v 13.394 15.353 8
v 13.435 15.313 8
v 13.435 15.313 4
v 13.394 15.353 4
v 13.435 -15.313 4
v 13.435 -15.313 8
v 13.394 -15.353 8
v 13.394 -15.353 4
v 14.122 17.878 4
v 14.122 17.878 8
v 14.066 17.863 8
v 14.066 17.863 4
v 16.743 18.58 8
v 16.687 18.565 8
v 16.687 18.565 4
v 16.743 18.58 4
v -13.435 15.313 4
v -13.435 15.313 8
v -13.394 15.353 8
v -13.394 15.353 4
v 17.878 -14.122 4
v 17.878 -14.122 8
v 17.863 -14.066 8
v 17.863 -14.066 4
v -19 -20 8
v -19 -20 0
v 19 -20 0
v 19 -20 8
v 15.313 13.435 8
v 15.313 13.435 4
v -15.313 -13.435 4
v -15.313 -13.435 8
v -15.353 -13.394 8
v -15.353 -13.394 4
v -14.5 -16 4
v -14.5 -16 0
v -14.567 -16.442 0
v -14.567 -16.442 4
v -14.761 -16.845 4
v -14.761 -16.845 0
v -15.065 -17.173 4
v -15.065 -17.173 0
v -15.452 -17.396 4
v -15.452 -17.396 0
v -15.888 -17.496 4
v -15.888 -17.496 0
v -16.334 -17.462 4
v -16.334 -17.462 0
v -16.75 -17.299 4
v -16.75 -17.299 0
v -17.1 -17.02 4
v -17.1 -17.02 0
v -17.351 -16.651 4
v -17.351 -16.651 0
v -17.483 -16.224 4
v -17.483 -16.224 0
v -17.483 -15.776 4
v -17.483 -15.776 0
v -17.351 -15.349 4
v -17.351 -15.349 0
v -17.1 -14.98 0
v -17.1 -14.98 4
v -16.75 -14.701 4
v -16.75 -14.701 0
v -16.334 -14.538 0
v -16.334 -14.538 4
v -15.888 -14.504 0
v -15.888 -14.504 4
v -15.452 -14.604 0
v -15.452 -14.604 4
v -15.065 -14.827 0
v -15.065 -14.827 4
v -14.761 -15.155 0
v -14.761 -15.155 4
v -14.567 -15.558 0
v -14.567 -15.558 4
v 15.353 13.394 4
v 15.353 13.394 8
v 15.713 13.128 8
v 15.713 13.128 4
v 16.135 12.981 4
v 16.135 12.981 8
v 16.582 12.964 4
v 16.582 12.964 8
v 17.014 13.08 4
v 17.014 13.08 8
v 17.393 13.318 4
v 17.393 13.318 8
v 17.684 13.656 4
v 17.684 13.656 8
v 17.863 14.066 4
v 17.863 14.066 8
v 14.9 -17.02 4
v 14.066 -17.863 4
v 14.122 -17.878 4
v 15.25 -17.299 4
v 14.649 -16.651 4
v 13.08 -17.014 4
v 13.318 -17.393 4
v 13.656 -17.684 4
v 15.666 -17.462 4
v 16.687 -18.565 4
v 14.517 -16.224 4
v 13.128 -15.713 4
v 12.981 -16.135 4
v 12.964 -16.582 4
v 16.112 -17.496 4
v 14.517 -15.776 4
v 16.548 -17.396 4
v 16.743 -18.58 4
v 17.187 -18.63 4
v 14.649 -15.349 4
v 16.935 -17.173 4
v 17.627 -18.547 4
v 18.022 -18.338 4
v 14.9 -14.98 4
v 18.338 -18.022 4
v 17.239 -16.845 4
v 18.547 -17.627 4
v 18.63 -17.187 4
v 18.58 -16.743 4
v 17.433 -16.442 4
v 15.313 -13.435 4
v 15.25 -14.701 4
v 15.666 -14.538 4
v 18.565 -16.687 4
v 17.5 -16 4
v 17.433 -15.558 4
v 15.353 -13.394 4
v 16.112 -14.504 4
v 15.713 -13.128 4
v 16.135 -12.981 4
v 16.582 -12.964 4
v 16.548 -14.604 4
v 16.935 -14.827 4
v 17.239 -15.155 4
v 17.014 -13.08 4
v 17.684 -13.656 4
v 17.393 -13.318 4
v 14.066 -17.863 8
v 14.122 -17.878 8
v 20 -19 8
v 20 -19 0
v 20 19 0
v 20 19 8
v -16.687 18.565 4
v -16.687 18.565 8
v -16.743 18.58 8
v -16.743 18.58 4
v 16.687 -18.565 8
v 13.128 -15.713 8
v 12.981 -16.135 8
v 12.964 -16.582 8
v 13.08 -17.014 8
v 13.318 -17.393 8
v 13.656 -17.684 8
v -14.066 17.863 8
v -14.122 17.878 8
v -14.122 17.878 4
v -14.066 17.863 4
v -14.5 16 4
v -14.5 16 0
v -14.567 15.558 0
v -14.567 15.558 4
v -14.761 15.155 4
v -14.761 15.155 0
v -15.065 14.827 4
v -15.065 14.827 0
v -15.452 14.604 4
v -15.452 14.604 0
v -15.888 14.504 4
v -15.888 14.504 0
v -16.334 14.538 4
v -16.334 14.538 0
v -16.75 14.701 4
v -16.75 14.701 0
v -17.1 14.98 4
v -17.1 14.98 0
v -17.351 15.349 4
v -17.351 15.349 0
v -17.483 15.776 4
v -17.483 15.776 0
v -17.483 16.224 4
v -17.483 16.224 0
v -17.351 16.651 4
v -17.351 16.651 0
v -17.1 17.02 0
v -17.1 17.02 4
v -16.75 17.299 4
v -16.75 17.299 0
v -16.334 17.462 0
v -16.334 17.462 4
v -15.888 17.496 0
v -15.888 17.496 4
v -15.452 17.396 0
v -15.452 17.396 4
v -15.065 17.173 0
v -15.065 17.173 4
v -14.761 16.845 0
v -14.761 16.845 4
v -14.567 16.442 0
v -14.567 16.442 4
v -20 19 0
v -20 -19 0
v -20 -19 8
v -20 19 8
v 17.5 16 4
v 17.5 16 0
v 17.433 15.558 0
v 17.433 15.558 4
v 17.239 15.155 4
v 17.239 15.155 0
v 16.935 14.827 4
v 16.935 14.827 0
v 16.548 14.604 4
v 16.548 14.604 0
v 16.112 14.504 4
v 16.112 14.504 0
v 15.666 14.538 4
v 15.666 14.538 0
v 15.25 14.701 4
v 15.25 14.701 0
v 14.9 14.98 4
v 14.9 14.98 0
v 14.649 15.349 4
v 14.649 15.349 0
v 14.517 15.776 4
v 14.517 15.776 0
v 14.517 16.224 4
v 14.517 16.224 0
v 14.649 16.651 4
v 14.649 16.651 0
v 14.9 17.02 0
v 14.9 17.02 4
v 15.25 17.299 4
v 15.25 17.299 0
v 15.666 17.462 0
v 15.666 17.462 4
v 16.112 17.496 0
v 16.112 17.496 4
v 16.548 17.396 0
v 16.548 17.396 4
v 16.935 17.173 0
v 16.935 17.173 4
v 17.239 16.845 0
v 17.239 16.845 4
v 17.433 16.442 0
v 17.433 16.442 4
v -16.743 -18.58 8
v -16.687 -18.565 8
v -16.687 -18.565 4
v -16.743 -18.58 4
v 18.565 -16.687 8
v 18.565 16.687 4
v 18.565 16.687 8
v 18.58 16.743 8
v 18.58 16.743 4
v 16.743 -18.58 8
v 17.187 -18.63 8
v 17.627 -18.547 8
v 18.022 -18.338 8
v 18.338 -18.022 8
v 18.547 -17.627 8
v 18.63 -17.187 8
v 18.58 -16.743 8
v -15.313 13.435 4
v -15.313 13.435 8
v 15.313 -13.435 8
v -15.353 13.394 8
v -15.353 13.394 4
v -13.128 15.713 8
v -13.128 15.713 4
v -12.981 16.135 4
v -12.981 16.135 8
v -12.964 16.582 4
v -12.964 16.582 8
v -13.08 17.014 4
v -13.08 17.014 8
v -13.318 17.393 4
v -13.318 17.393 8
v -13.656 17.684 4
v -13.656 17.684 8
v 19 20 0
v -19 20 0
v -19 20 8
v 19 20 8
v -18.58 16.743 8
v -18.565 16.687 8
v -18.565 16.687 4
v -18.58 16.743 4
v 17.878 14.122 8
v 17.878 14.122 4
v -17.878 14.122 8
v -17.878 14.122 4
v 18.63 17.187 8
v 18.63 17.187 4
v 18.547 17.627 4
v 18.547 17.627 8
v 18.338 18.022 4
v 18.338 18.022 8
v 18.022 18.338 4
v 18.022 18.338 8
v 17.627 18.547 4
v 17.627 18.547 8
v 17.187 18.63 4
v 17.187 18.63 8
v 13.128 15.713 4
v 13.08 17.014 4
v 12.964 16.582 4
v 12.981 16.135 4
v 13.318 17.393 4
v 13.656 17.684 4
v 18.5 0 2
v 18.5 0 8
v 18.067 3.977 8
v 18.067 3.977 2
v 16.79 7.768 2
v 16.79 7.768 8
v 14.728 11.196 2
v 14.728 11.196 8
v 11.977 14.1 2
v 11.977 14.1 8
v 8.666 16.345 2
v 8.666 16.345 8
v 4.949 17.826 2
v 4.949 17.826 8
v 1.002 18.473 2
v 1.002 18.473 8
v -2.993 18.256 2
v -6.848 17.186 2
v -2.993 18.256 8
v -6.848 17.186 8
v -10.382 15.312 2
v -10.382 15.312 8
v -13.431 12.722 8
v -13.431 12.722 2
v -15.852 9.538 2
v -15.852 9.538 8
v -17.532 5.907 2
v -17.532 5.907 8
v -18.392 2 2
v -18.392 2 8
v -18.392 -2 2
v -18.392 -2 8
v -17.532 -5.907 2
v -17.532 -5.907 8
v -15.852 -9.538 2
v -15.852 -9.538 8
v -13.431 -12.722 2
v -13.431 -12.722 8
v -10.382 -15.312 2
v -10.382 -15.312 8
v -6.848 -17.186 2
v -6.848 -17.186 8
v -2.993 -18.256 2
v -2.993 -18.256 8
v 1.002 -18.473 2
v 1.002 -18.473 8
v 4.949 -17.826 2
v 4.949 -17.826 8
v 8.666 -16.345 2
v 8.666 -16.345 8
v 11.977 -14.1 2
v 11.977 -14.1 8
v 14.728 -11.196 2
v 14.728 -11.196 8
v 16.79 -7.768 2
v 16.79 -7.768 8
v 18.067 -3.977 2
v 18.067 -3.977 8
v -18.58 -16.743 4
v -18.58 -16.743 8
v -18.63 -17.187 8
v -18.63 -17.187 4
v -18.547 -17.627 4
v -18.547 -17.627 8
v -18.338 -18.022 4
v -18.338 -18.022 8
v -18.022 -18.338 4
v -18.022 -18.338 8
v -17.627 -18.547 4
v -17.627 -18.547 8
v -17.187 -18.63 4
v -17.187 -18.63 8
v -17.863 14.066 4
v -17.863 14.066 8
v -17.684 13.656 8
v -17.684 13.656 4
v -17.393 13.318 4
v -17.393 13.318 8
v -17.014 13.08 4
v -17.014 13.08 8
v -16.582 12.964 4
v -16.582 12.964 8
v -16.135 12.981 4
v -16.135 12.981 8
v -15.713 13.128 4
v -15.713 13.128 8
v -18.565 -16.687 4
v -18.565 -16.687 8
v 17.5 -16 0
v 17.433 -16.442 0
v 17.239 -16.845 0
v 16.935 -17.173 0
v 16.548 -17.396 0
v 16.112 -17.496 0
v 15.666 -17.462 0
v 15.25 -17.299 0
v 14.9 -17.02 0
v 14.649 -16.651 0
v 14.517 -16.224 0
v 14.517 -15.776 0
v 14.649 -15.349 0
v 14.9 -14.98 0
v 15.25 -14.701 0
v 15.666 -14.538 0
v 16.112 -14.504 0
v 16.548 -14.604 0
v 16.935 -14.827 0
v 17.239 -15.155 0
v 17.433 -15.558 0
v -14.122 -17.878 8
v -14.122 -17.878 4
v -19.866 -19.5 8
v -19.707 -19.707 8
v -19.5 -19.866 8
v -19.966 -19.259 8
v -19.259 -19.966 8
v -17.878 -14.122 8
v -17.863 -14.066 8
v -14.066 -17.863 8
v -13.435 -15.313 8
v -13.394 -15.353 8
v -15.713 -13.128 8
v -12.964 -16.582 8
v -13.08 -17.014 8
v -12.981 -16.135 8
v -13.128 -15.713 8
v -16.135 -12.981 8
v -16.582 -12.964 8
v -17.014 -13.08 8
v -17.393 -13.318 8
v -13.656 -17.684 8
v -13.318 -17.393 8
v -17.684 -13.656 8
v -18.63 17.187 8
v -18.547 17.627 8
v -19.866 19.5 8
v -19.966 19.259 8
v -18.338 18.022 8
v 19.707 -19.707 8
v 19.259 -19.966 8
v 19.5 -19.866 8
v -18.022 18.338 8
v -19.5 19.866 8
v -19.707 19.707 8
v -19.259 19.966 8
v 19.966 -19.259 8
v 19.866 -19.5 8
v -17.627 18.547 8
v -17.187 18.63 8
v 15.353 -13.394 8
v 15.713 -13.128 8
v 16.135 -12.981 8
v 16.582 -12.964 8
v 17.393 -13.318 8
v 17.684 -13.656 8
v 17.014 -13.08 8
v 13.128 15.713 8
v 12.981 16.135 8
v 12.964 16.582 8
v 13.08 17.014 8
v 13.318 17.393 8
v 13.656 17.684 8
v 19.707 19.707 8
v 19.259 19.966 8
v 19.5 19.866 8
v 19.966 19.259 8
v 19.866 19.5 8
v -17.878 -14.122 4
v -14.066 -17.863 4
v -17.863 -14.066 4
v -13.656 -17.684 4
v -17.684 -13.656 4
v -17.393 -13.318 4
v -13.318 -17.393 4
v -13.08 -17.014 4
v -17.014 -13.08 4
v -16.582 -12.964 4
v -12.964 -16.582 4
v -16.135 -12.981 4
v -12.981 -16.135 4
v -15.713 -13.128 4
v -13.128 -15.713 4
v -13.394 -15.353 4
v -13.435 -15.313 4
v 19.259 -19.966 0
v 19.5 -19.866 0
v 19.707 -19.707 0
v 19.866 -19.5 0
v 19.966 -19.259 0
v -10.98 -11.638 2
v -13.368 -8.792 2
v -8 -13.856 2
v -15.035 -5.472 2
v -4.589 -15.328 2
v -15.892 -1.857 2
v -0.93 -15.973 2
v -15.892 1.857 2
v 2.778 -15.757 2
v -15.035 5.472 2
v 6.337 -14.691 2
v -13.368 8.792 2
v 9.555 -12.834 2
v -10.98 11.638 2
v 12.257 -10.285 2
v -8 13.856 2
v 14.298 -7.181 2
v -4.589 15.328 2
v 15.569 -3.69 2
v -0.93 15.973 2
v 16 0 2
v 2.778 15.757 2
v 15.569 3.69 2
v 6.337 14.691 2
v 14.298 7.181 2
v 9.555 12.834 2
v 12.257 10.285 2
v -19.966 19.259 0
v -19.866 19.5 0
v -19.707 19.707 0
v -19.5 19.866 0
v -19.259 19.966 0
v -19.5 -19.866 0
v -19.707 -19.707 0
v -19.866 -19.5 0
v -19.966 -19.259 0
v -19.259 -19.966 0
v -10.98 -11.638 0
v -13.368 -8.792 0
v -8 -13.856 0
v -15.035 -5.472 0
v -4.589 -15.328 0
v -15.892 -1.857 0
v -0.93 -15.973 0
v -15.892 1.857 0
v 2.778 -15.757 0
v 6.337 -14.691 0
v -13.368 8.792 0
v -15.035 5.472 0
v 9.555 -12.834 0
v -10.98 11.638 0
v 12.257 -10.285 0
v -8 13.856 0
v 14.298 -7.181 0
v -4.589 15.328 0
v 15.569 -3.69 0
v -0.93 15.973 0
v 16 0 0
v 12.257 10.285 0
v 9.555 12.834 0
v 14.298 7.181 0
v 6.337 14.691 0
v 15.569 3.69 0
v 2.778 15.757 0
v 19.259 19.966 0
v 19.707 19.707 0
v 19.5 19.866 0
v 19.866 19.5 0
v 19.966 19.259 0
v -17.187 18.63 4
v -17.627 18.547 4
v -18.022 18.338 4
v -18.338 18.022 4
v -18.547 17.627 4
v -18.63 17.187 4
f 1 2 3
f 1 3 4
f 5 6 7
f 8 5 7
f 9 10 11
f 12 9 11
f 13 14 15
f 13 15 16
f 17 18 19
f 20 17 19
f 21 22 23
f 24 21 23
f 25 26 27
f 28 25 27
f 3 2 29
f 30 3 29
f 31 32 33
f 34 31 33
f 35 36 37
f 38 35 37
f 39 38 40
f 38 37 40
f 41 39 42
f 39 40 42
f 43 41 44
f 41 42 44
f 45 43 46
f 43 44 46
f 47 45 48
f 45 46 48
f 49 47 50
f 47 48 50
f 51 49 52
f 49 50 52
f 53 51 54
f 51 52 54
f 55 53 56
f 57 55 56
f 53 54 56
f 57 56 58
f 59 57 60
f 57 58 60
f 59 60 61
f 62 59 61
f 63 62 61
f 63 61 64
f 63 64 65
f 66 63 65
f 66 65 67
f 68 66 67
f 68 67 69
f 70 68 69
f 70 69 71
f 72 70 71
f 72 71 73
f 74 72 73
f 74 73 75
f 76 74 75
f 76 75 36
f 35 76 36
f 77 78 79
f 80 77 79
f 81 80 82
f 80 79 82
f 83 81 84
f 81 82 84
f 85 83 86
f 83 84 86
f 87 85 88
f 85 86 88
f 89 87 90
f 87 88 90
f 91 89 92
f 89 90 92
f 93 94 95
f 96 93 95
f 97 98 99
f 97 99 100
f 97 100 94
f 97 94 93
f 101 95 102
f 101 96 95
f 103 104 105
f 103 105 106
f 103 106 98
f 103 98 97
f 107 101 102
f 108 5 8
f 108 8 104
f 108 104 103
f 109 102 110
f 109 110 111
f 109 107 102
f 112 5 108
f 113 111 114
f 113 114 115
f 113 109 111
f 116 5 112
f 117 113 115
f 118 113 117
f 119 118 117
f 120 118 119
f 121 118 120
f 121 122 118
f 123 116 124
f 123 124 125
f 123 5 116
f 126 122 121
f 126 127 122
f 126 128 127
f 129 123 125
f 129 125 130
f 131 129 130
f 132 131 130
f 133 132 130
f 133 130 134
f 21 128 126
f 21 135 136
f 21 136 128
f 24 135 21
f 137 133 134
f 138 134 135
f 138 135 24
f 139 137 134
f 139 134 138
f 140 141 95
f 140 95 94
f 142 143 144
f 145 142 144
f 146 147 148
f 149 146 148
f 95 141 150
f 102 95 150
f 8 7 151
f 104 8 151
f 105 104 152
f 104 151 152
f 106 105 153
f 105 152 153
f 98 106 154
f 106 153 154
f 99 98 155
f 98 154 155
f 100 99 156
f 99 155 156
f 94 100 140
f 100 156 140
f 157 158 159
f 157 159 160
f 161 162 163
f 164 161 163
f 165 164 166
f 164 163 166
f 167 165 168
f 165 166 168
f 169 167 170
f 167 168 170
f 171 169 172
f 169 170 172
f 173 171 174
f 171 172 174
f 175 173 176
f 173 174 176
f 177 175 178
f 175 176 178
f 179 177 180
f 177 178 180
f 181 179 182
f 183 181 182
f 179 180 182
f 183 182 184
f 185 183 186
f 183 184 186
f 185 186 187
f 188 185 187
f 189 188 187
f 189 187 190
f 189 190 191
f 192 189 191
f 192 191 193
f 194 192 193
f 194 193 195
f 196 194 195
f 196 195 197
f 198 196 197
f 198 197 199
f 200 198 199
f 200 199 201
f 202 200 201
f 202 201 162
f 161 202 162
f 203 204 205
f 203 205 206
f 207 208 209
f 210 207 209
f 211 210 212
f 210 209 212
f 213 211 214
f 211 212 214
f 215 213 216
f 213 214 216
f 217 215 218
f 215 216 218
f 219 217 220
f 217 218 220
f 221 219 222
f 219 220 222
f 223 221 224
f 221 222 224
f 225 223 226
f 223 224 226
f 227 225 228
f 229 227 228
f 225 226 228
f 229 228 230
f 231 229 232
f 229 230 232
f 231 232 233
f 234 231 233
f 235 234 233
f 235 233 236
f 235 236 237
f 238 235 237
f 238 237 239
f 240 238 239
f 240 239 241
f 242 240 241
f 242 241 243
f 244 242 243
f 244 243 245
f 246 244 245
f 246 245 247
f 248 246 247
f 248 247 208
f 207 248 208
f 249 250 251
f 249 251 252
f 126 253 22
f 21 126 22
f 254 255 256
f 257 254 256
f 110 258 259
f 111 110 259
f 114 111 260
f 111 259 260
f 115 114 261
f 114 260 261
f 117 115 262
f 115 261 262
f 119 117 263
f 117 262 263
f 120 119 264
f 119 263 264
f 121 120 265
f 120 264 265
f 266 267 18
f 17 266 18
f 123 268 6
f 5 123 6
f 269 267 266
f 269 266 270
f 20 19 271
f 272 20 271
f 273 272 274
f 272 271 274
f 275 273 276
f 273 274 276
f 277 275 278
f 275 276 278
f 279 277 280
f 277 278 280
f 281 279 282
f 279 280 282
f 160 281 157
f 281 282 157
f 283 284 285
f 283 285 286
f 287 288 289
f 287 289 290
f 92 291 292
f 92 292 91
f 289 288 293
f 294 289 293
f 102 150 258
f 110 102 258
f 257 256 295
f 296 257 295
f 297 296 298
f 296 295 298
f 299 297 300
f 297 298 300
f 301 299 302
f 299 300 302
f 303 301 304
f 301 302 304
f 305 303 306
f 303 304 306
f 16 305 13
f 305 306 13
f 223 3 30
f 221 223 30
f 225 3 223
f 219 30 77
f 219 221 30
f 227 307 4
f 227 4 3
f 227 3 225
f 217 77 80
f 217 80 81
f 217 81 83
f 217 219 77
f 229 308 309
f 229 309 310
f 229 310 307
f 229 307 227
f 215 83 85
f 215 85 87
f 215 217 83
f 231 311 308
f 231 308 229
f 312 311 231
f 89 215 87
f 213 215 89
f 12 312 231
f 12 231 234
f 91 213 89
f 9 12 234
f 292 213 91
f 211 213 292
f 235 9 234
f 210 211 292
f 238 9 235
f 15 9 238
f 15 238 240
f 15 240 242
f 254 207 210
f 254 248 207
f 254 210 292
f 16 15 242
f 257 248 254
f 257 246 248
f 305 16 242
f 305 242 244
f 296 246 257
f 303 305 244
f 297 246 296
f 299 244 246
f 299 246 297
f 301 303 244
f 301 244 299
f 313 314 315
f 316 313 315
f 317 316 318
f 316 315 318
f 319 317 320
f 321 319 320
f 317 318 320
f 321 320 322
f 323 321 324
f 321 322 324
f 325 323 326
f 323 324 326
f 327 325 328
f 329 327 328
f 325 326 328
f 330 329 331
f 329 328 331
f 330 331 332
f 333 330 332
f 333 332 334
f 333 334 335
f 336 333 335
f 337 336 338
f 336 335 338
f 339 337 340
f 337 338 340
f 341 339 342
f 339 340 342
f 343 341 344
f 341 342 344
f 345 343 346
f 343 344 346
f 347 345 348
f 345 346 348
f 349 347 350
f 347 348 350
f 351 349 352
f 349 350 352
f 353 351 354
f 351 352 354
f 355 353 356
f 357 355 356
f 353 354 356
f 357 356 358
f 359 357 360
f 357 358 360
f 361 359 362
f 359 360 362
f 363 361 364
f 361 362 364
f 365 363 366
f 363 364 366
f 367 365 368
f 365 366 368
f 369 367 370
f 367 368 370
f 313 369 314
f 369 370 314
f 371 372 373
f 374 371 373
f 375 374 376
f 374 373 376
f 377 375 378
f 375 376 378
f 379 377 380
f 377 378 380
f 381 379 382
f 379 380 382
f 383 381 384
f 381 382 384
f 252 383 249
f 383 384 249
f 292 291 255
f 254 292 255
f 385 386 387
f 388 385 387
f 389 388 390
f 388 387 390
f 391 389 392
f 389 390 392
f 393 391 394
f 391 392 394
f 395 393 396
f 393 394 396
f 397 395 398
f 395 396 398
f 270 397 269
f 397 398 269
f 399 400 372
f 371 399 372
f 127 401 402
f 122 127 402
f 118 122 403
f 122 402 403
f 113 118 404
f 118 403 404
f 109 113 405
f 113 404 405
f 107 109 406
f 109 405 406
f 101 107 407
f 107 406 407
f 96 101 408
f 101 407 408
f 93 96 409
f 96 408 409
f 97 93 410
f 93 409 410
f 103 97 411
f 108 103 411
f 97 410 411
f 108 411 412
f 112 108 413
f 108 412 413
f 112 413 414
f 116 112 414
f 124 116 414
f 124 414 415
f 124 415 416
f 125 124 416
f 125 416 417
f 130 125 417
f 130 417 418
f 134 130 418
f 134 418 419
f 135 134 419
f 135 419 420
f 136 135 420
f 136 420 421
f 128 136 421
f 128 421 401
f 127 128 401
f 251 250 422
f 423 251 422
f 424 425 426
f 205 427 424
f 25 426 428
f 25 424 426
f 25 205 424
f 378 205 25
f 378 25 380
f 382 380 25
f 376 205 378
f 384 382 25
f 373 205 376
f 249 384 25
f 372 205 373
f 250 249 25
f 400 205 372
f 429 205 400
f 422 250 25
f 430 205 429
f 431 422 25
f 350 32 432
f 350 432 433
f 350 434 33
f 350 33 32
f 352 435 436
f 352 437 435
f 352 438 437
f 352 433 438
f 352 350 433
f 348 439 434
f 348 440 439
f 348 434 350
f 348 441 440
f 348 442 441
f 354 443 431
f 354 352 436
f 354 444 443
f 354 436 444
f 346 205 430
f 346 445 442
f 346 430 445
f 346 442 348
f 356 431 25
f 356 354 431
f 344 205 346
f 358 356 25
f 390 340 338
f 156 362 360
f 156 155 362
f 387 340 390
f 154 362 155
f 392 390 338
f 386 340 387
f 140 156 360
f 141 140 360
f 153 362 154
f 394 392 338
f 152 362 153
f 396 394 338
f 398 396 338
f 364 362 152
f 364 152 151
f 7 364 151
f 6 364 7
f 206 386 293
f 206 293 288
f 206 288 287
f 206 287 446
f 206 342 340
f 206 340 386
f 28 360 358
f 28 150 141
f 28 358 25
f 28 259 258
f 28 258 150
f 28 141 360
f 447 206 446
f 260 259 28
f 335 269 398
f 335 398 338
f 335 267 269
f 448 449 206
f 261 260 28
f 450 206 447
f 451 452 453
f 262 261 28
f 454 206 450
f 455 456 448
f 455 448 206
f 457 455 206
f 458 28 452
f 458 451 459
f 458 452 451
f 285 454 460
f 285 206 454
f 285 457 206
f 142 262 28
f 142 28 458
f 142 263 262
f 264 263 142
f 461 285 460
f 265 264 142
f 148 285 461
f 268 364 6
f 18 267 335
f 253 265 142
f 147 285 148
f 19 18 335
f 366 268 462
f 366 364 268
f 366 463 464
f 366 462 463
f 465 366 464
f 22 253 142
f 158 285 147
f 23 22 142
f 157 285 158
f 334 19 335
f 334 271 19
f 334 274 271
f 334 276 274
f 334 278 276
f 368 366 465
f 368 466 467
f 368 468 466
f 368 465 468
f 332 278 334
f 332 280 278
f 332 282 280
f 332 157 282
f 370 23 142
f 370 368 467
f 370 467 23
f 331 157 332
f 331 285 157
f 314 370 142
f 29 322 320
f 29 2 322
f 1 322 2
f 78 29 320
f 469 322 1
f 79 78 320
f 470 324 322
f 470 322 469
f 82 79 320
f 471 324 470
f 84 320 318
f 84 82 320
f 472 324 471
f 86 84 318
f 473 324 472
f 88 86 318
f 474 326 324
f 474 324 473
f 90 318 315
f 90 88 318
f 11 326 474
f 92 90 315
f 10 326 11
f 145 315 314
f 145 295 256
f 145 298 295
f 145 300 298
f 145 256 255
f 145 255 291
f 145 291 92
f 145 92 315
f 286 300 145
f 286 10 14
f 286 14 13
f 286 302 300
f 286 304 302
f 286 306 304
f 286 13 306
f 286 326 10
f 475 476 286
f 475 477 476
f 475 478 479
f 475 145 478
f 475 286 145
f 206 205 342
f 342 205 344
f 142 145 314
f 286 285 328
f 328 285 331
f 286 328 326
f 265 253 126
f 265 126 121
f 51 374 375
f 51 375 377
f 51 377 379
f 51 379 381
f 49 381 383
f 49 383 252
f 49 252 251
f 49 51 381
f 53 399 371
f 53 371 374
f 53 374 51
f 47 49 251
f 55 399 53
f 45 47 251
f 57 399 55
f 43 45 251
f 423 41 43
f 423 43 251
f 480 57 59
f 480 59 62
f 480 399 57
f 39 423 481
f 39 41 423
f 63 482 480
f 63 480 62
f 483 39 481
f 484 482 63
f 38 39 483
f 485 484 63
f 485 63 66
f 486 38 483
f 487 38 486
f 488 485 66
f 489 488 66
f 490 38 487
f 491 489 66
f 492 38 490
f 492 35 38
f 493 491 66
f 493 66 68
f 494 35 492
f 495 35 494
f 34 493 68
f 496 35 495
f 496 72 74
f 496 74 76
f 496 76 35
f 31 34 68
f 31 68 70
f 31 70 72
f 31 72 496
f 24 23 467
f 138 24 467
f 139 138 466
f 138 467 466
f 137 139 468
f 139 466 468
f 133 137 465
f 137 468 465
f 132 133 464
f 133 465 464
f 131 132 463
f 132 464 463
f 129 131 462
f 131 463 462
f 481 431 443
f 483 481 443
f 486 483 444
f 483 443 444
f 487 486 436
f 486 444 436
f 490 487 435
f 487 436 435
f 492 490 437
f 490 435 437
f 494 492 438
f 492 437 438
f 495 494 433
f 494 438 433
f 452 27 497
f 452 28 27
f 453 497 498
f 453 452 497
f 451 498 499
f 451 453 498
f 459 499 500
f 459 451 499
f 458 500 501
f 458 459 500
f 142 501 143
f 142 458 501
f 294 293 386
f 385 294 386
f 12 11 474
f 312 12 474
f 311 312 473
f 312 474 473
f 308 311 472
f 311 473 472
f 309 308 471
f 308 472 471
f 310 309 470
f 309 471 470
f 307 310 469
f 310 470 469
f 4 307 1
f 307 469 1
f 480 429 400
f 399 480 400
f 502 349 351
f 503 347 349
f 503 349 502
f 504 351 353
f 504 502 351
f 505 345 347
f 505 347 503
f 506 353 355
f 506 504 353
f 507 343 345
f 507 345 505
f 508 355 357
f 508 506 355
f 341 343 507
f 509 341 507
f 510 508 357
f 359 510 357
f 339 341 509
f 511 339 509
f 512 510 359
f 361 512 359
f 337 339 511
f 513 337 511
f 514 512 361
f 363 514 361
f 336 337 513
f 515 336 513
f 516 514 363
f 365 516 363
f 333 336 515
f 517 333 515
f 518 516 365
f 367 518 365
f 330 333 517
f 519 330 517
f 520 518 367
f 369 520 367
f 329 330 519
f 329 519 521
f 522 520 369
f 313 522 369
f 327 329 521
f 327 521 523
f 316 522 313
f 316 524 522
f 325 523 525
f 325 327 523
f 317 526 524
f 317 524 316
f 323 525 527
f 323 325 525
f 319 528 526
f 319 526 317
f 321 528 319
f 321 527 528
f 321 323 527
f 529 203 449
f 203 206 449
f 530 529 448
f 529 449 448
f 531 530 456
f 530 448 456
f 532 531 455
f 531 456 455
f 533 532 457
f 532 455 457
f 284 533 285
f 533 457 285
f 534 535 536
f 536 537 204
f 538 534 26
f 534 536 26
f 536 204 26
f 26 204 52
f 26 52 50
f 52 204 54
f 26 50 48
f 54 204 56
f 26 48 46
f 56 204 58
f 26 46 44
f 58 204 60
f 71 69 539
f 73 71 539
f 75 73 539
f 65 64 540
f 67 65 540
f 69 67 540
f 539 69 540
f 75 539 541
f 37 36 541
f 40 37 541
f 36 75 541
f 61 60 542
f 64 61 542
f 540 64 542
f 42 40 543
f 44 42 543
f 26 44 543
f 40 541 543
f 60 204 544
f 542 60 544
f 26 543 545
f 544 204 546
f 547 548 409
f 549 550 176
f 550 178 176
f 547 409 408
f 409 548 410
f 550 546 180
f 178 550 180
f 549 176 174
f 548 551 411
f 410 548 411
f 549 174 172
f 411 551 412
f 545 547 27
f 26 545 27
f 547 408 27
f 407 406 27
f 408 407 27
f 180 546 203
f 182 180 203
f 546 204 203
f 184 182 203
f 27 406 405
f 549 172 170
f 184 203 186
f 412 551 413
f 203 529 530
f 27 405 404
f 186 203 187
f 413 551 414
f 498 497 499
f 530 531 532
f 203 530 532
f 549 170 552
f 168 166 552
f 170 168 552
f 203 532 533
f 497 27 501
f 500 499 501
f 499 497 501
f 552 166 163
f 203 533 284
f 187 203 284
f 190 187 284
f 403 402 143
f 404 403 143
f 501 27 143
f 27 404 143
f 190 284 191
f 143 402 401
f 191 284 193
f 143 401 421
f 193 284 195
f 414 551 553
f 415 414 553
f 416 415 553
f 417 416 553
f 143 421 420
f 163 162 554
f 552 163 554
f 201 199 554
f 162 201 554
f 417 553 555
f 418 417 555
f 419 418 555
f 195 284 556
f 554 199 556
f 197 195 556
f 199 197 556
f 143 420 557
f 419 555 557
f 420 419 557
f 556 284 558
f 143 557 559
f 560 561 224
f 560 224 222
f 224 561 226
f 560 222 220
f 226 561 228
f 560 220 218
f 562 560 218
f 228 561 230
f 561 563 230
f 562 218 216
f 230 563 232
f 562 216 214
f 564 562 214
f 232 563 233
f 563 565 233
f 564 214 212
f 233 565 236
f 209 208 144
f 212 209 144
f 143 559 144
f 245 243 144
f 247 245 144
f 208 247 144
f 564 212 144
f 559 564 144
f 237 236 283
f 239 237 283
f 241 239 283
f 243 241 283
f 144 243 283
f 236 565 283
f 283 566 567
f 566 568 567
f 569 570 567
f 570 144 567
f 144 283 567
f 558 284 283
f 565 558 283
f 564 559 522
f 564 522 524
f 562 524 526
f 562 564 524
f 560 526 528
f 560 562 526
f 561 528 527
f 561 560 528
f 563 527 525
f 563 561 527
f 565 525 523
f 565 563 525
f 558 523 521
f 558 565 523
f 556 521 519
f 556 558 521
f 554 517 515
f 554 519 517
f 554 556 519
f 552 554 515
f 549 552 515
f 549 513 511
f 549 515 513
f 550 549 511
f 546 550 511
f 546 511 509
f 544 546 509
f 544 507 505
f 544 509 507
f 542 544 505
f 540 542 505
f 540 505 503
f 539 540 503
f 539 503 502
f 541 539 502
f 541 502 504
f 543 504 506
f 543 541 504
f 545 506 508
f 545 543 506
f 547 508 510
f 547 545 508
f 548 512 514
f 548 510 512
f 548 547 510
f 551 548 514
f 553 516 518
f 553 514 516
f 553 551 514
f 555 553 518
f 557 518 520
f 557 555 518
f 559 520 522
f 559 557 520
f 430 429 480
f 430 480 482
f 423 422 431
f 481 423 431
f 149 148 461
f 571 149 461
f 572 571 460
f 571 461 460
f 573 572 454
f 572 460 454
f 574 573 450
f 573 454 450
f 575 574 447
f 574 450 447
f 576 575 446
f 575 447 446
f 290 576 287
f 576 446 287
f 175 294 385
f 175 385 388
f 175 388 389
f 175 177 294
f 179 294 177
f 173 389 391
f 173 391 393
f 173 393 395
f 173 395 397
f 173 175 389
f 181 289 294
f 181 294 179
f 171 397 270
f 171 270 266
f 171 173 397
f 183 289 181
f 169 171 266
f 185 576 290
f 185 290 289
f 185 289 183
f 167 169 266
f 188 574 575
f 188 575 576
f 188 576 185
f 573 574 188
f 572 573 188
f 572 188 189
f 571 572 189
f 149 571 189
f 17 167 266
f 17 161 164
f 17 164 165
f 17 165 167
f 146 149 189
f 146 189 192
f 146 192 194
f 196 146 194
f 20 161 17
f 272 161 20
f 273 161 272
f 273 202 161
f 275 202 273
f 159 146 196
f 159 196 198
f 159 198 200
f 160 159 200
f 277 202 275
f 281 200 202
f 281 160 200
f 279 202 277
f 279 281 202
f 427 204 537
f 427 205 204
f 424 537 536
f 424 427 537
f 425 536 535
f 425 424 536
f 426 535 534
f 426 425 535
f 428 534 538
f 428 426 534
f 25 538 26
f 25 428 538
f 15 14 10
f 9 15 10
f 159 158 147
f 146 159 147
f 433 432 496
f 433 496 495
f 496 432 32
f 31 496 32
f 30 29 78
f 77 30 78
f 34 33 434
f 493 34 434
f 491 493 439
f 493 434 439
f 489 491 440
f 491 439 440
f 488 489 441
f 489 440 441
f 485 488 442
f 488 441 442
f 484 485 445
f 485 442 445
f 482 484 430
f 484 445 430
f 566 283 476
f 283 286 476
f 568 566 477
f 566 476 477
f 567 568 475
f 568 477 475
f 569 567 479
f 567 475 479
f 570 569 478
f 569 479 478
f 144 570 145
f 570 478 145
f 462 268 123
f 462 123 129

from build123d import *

# Parameters (mm, degrees)
SKETCH_W        = 40
SKETCH_H        = 40
SKETCH_R        = 16
PAD_DEPTH       = 8
SKETCH005_R     = 1.5
POCKET003_DEPTH = 8.001
POCKET_DEPTH    = 4
SKETCH006_R     = 18.5
POCKET004_DEPTH = 6
FILLET_R        = 1


with BuildPart() as part:
    # Sketch → Pad (new body)
    with BuildSketch(Plane.XY):
        Rectangle(SKETCH_W, SKETCH_H)
        Circle(SKETCH_R, mode=Mode.SUBTRACT)
    extrude(amount=PAD_DEPTH)

    # Sketch005 (on Face6 of Pad) → Pocket003 (cut, through all)
    with BuildSketch(Plane(origin=(0, 0, 0), x_dir=(1, 0, 0), z_dir=(0, 0, -1))):
        with Locations((-16, 16)):
            Circle(SKETCH005_R)
        with Locations((16, 16)):
            Circle(SKETCH005_R)
        with Locations((-16, -16)):
            Circle(SKETCH005_R)
        with Locations((16, -16)):
            Circle(SKETCH005_R)
    extrude(amount=-POCKET003_DEPTH, mode=Mode.SUBTRACT)

    # Sketch004 (on Face5 of Pocket003) → Pocket (cut)
    with BuildSketch(Plane.XY.offset(8)):
        with BuildLine():
            Line((13.434683, 15.312625), (15.312625, 13.434683))
            Line((15.312625, 13.434683), (15.35345, 13.393859))
            ThreePointArc((15.35345, 13.393859), (16.802339, 13.00563), (17.862999, 14.06629))
            Line((17.877942, 14.122058), (17.862999, 14.06629))
            Line((17.877942, 14.122058), (18.565317, 16.687375))
            Line((18.565317, 16.687375), (18.58026, 16.743142))
            ThreePointArc((18.58026, 16.743142), (18.192031, 18.192031), (16.743142, 18.58026))
            Line((16.687375, 18.565317), (16.743142, 18.58026))
            Line((16.687375, 18.565317), (14.122058, 17.877942))
            Line((14.122058, 17.877942), (14.06629, 17.862999))
            ThreePointArc((14.06629, 17.862999), (13.00563, 16.802339), (13.393859, 15.35345))
            Line((13.434683, 15.312625), (13.393859, 15.35345))
        make_face()
        with BuildLine():
            Line((14.122058, -17.877942), (16.687375, -18.565317))
            Line((16.687375, -18.565317), (16.743142, -18.58026))
            ThreePointArc((16.743142, -18.58026), (18.192031, -18.192031), (18.58026, -16.743142))
            Line((18.565317, -16.687375), (18.58026, -16.743142))
            Line((18.565317, -16.687375), (17.877942, -14.122058))
            Line((17.877942, -14.122058), (17.862999, -14.06629))
            ThreePointArc((17.862999, -14.06629), (16.802339, -13.00563), (15.35345, -13.393859))
            Line((15.312625, -13.434683), (15.35345, -13.393859))
            Line((15.312625, -13.434683), (13.434683, -15.312625))
            Line((13.434683, -15.312625), (13.393859, -15.35345))
            ThreePointArc((13.393859, -15.35345), (13.00563, -16.802339), (14.06629, -17.862999))
            Line((14.122058, -17.877942), (14.06629, -17.862999))
        make_face()
        with BuildLine():
            Line((-14.122058, 17.877942), (-16.687375, 18.565317))
            Line((-16.687375, 18.565317), (-16.743142, 18.58026))
            ThreePointArc((-16.743142, 18.58026), (-18.192031, 18.192031), (-18.58026, 16.743142))
            Line((-18.565317, 16.687375), (-18.58026, 16.743142))
            Line((-18.565317, 16.687375), (-17.877942, 14.122058))
            Line((-17.877942, 14.122058), (-17.862999, 14.06629))
            ThreePointArc((-17.862999, 14.06629), (-16.802339, 13.00563), (-15.35345, 13.393859))
            Line((-15.312625, 13.434683), (-15.35345, 13.393859))
            Line((-15.312625, 13.434683), (-13.434683, 15.312625))
            Line((-13.434683, 15.312625), (-13.393859, 15.35345))
            ThreePointArc((-13.393859, 15.35345), (-13.00563, 16.802339), (-14.06629, 17.862999))
            Line((-14.122058, 17.877942), (-14.06629, 17.862999))
        make_face()
        with BuildLine():
            Line((-13.434683, -15.312625), (-15.312625, -13.434683))
            Line((-15.312625, -13.434683), (-15.35345, -13.393859))
            ThreePointArc((-15.35345, -13.393859), (-16.802339, -13.00563), (-17.862999, -14.06629))
            Line((-17.877942, -14.122058), (-17.862999, -14.06629))
            Line((-17.877942, -14.122058), (-18.565317, -16.687375))
            Line((-18.565317, -16.687375), (-18.58026, -16.743142))
            ThreePointArc((-18.58026, -16.743142), (-18.192031, -18.192031), (-16.743142, -18.58026))
            Line((-16.687375, -18.565317), (-16.743142, -18.58026))
            Line((-16.687375, -18.565317), (-14.122058, -17.877942))
            Line((-14.122058, -17.877942), (-14.06629, -17.862999))
            ThreePointArc((-14.06629, -17.862999), (-13.00563, -16.802339), (-13.393859, -15.35345))
            Line((-13.434683, -15.312625), (-13.393859, -15.35345))
        make_face()
    extrude(amount=-POCKET_DEPTH, mode=Mode.SUBTRACT)

    # Sketch006 (on Face5 of Pocket) → Pocket004 (cut)
    with BuildSketch(Plane.XY.offset(8)):
        Circle(SKETCH006_R)
    extrude(amount=-POCKET004_DEPTH, mode=Mode.SUBTRACT)

    # Fillet
    fillet_edges = [part.edges().sort_by_distance(p)[0] for p in [
        (-20, -20, 4),
        (-20, 20, 4),
        (20, -20, 4),
        (20, 20, 4),
    ]]
    fillet(fillet_edges, radius=FILLET_R)


solid = part.part
